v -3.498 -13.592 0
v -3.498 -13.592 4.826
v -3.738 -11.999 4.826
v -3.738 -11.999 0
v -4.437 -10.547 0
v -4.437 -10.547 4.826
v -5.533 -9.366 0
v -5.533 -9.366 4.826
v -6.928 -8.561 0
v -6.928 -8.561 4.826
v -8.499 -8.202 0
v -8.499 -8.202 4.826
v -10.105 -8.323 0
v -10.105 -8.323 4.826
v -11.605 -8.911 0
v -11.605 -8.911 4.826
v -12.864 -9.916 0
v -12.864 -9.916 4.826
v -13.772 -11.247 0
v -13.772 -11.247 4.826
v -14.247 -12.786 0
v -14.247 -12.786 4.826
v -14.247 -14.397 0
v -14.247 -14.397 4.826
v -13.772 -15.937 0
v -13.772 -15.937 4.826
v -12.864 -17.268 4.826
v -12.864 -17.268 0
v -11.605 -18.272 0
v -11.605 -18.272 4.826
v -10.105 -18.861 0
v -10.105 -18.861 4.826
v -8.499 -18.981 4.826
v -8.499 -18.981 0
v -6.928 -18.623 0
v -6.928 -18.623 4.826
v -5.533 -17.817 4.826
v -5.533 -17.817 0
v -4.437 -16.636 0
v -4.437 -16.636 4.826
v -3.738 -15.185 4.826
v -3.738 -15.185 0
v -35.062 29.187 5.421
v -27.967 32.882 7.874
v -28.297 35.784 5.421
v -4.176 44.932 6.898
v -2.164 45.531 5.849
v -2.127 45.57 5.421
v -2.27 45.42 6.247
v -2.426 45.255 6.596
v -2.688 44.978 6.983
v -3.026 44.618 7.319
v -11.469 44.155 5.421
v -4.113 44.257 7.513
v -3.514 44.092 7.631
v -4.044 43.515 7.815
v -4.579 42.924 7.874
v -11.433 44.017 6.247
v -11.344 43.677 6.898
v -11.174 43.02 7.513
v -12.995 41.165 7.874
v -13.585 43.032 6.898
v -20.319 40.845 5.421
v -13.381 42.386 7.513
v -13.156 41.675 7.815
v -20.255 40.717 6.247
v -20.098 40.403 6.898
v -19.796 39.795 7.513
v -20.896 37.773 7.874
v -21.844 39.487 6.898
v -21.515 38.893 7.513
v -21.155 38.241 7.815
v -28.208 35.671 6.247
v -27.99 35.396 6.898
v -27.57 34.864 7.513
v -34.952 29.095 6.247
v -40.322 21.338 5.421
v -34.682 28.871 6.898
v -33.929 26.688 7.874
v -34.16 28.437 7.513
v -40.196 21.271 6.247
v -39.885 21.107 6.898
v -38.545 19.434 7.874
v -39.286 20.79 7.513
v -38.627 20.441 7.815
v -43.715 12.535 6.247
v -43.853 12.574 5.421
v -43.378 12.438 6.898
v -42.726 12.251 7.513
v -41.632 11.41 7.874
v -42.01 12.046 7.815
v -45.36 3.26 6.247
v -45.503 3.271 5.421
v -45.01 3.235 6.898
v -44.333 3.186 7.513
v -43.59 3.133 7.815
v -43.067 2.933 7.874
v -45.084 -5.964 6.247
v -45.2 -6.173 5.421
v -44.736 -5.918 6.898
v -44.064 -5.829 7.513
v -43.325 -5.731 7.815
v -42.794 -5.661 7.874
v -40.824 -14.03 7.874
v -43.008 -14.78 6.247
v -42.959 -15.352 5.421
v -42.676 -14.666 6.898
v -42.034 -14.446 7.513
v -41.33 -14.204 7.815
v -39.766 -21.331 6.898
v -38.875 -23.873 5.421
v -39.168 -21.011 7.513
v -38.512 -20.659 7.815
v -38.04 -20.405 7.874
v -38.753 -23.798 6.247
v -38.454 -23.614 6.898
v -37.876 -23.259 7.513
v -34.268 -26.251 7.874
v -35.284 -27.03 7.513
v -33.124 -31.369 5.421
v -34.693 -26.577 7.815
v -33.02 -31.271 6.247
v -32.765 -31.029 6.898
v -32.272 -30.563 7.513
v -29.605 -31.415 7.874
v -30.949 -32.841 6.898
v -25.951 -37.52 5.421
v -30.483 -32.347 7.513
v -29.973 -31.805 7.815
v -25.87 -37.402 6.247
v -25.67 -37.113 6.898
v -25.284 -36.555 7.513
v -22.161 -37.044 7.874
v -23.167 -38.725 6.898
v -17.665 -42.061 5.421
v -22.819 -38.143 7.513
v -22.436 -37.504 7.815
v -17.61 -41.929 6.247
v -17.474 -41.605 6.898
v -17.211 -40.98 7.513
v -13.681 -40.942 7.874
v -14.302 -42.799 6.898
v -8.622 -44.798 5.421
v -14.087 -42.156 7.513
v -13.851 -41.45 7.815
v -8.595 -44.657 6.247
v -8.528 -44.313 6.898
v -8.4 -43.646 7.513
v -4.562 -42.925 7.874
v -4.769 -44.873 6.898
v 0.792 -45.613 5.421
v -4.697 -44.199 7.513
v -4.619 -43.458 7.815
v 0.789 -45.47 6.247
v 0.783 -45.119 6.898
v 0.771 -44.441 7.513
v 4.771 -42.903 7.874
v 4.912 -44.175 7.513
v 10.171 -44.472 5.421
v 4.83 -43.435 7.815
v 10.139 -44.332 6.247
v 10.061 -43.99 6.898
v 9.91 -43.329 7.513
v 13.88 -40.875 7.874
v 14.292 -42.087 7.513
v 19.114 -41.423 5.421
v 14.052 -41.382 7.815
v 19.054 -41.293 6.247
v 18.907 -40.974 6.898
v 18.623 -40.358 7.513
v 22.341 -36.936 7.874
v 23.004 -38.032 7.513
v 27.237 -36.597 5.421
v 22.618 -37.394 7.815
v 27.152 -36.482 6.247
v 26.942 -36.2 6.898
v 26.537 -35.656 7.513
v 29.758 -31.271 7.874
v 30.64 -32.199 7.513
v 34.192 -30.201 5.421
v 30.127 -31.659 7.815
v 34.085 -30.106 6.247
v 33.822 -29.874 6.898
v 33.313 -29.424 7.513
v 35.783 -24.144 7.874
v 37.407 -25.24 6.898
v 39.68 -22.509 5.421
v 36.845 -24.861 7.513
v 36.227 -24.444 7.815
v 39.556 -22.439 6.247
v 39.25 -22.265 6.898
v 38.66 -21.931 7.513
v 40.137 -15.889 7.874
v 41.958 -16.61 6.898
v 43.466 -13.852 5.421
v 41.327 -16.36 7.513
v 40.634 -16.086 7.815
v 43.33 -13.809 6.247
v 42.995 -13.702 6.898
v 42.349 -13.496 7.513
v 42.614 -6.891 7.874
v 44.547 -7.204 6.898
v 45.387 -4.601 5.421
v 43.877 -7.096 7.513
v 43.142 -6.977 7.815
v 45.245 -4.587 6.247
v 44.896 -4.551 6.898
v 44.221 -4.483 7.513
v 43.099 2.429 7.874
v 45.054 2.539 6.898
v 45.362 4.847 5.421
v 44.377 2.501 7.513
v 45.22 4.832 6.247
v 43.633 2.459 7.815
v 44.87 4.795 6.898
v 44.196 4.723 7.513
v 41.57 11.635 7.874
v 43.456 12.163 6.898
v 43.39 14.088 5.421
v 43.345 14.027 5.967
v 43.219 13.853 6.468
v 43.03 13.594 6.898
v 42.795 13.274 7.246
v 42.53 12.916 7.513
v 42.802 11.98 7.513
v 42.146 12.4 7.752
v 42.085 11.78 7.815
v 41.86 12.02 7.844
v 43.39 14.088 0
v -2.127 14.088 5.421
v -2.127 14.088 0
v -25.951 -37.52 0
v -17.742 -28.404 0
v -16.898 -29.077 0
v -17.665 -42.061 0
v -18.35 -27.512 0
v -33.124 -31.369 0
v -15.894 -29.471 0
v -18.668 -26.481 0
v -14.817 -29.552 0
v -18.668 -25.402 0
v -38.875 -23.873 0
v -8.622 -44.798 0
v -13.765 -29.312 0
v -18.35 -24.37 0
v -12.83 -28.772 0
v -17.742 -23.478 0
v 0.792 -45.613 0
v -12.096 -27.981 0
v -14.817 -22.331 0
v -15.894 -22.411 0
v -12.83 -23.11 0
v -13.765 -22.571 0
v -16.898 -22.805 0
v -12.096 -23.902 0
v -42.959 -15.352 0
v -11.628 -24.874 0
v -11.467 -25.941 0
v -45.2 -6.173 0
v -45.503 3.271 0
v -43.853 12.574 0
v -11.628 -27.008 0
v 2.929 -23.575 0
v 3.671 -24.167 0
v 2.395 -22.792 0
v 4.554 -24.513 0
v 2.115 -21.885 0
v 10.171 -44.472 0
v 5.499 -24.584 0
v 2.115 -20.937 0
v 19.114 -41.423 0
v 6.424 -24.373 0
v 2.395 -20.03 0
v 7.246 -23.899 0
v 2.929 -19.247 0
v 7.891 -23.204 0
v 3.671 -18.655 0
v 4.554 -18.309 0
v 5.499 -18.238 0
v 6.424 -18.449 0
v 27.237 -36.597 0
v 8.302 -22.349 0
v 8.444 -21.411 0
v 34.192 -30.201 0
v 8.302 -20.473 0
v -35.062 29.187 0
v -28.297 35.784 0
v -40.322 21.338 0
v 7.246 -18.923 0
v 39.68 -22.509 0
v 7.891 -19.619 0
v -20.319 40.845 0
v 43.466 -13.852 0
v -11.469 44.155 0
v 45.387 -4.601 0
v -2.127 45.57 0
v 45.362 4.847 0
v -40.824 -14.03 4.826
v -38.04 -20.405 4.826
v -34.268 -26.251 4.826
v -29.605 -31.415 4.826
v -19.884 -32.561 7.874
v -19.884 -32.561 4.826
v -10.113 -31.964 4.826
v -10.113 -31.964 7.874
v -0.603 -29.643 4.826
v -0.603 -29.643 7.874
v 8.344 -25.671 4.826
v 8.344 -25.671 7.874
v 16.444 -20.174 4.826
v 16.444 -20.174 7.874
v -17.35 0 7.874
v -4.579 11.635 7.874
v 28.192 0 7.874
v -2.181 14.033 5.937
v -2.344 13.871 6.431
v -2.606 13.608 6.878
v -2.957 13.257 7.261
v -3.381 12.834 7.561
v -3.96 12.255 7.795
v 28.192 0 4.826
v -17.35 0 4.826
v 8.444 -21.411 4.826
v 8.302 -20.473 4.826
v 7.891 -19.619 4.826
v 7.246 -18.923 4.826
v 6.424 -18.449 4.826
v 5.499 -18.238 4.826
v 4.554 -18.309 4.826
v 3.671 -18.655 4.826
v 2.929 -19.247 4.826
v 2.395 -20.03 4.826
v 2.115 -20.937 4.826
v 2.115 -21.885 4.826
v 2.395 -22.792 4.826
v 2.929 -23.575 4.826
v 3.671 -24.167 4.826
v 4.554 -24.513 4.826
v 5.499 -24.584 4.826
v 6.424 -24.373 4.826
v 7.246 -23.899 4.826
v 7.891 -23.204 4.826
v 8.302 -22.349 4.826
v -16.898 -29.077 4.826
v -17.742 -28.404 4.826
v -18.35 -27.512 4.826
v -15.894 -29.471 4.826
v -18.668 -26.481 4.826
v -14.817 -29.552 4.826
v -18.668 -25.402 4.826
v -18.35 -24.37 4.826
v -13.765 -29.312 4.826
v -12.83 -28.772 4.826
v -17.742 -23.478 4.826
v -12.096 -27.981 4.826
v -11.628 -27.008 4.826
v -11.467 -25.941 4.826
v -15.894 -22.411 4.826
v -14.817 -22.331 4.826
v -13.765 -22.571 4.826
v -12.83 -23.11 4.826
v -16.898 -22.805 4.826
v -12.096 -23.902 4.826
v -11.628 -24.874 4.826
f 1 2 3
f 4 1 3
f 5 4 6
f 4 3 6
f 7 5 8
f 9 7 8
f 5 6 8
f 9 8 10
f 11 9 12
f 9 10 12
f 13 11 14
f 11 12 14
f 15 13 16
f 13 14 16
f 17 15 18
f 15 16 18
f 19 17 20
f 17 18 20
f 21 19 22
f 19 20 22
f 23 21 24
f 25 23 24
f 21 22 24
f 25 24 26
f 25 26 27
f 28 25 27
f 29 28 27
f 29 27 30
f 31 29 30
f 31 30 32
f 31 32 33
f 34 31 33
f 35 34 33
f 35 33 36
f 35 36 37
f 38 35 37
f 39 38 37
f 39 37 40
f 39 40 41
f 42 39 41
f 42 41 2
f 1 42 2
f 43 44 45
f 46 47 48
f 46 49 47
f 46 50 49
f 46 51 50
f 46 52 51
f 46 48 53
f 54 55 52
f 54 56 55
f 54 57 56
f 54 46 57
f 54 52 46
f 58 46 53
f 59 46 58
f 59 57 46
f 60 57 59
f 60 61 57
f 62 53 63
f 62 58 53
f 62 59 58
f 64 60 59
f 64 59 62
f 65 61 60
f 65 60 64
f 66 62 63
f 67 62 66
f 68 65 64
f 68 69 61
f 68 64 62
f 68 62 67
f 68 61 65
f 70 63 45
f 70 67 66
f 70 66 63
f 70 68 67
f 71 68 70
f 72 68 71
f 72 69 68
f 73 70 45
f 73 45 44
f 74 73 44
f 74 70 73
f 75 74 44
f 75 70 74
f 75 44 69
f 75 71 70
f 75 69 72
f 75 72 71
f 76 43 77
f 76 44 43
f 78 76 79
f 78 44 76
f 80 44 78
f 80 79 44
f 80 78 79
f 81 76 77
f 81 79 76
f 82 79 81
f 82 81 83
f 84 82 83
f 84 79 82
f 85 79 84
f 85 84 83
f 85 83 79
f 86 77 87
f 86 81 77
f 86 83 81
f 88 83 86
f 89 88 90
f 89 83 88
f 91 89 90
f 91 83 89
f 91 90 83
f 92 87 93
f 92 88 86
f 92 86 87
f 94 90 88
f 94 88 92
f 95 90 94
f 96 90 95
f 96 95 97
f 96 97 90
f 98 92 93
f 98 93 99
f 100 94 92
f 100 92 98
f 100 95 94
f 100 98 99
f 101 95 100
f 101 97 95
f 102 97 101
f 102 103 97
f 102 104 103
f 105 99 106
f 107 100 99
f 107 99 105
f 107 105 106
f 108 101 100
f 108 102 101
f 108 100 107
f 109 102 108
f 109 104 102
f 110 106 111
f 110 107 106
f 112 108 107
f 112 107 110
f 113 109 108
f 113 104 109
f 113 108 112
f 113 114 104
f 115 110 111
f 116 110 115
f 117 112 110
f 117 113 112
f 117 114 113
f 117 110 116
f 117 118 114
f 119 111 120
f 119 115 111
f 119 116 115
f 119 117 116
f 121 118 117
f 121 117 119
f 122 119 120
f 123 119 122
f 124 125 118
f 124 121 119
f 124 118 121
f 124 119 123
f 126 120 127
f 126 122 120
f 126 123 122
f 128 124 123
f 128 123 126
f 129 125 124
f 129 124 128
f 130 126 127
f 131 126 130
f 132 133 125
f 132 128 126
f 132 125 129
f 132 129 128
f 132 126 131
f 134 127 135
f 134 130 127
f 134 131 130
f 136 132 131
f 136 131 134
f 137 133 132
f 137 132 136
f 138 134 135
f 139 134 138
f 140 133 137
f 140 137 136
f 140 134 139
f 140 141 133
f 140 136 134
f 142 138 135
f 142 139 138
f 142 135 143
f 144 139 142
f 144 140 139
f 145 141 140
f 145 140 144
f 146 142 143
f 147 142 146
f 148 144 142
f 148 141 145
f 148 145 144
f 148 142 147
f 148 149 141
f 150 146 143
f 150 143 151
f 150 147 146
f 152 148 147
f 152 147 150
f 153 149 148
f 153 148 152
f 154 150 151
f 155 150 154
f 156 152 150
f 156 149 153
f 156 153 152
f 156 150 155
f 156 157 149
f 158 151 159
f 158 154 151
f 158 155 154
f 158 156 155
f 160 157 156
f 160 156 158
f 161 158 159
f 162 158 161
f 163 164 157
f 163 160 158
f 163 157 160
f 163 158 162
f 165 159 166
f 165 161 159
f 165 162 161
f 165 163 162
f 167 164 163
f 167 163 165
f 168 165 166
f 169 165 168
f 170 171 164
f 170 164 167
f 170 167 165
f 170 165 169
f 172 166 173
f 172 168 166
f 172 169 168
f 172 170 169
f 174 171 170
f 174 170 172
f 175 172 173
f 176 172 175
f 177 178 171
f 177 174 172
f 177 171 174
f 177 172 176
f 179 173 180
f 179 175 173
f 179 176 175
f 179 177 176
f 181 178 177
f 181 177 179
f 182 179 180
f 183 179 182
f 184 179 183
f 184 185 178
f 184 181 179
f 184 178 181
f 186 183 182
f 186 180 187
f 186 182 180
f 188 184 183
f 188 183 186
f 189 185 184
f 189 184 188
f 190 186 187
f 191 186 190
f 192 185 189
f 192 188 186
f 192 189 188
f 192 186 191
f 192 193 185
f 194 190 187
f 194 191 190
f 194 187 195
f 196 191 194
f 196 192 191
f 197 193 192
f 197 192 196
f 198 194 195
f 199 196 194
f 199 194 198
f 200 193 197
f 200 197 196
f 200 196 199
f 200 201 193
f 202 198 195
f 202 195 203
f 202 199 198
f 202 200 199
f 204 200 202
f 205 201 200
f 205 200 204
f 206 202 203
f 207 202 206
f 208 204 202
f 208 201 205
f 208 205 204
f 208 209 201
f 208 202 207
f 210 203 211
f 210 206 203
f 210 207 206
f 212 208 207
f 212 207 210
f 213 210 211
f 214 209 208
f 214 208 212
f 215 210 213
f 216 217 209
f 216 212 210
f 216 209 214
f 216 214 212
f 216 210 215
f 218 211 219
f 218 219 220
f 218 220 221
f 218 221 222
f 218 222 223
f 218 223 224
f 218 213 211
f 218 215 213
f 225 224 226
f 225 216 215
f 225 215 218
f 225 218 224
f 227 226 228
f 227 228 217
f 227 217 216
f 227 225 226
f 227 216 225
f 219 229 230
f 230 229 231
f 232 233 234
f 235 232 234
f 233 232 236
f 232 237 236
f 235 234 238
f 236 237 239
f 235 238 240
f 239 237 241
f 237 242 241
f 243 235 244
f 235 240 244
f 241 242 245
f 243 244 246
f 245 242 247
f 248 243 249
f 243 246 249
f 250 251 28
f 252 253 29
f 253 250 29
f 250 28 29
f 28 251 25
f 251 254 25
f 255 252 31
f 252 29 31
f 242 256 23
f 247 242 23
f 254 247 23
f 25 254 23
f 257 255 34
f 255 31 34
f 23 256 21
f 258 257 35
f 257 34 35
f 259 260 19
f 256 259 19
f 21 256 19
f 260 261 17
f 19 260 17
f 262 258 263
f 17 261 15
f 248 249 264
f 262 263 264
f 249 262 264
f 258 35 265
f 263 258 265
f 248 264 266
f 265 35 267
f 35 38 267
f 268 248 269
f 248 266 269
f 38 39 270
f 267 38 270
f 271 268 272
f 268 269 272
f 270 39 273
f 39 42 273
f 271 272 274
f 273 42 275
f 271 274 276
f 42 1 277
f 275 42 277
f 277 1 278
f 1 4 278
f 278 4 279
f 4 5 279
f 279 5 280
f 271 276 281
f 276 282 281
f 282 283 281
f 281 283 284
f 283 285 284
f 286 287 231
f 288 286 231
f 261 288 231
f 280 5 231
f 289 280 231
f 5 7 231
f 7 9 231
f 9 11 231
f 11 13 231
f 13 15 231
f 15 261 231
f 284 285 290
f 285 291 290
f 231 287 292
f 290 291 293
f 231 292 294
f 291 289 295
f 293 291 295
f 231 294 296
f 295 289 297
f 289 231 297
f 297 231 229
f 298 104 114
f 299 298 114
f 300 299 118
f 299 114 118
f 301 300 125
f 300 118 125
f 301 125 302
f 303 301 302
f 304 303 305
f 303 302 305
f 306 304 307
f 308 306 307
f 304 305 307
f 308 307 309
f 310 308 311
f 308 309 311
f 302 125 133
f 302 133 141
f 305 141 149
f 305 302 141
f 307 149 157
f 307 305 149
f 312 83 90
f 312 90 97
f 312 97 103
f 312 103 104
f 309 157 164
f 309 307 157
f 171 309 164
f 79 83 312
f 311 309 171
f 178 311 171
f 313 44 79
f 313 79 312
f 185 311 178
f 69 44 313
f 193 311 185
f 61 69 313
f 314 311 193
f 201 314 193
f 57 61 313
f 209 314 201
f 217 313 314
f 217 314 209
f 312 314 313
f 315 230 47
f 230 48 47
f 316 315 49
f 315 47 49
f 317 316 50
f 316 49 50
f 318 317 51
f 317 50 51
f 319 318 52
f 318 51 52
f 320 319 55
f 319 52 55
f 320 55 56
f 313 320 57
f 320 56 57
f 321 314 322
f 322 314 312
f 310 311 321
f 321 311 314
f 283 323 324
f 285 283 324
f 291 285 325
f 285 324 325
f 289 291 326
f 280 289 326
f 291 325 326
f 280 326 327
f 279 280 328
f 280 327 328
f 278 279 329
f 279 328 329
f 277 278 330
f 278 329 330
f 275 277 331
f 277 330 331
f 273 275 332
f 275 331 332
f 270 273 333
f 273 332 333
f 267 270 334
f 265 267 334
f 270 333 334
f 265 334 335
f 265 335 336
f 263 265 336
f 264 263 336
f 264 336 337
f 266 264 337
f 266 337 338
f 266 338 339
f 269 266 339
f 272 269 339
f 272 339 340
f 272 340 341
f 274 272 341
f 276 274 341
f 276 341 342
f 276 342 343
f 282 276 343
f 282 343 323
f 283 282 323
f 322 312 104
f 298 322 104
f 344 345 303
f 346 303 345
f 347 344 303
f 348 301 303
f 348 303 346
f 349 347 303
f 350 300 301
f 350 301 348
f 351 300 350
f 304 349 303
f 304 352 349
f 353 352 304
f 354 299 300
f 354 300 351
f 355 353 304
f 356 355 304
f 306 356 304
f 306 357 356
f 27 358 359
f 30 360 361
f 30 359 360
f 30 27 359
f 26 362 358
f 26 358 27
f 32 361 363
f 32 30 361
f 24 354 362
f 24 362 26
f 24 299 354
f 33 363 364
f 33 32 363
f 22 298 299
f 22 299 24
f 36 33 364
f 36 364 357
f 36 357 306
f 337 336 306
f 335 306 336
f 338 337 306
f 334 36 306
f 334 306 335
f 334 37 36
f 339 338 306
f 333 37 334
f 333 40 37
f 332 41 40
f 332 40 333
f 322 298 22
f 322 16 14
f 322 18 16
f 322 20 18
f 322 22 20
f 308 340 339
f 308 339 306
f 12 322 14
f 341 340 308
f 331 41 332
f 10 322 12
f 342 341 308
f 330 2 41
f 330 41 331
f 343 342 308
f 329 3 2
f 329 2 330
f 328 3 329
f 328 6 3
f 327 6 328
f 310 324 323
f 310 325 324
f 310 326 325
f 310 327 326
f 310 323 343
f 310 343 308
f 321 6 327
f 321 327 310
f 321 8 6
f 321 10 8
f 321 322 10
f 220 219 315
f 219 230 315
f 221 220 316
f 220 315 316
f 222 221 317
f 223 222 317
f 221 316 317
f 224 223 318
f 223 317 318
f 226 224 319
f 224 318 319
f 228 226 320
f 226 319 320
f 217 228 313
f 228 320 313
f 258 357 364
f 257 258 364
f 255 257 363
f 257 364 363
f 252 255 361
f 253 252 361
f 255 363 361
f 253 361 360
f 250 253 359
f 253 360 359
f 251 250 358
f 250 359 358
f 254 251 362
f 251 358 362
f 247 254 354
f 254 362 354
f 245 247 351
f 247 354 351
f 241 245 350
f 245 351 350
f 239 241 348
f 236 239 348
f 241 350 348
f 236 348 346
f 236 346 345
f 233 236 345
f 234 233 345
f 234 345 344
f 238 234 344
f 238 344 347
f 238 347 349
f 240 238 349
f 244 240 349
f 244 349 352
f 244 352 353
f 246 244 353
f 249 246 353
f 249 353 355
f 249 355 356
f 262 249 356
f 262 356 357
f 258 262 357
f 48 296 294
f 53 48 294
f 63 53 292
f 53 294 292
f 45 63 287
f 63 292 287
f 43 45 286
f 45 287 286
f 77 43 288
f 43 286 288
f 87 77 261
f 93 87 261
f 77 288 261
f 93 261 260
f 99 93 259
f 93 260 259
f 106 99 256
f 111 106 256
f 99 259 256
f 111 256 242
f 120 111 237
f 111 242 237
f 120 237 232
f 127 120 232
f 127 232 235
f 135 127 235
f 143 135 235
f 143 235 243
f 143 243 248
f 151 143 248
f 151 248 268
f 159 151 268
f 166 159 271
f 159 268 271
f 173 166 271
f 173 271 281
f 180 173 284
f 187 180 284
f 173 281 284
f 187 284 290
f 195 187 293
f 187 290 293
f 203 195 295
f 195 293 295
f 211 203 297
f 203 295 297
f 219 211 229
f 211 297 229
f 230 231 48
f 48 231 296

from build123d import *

# Parameters (mm, degrees)
F1_DEPTH = 7.874
F2_R     = 2.452841
F4_DEPTH = 3.048
F5_R     = 5.404397
F5_R_2   = 3.62081
F5_R_3   = 3.18203
F6_DEPTH = 25.4


with BuildPart() as f1:
    # F0 (on Top) → F1 (new body)
    with BuildSketch(Plane.XY):
        with BuildLine():
            Line((-2.126512, 14.08814), (-2.126512, 45.570451))
            ThreePointArc((-2.126512, 45.570451), (-25.951063, -37.519734), (43.390234, 14.08814))
            Line((43.390234, 14.08814), (-2.126512, 14.08814))
        make_face()
    extrude(amount=F1_DEPTH)

    # F2
    f2_edges = [f1.edges().sort_by_distance(p)[0] for p in [
        (20.631861, 14.08814, 7.874),
        (-2.126512, 29.829296, 7.874),
        (-25.951063, -37.519734, 7.874),
    ]]
    fillet(f2_edges, radius=F2_R)

    # F3 (on face) → F4 (cut)
    with BuildSketch(Plane.XY.offset(7.874)):
        with BuildLine():
            ThreePointArc((-40.823762, -14.029525), (-36.271678, -23.40454), (-29.605426, -31.415376))
            ThreePointArc((-29.605426, -31.415376), (-5.306065, -31.015874), (16.444359, -20.174399))
            Line((16.444359, -20.174399), (28.192235, 0))
            Line((28.192235, 0), (-17.349953, 0))
            Line((-17.349953, 0), (-40.823762, -14.029525))
        make_face()
    extrude(amount=-F4_DEPTH, mode=Mode.SUBTRACT)

    # F5 (on face) → F6 (cut)
    with BuildSketch(Plane.XY.offset(4.826)):
        with Locations((-8.902777, -13.591718)):
            Circle(F5_R)
        with Locations((-15.087833, -25.941195)):
            Circle(F5_R_2)
        with Locations((5.261666, -21.411046)):
            Circle(F5_R_3)
    extrude(amount=-F6_DEPTH, mode=Mode.SUBTRACT)


solid = f1.part
